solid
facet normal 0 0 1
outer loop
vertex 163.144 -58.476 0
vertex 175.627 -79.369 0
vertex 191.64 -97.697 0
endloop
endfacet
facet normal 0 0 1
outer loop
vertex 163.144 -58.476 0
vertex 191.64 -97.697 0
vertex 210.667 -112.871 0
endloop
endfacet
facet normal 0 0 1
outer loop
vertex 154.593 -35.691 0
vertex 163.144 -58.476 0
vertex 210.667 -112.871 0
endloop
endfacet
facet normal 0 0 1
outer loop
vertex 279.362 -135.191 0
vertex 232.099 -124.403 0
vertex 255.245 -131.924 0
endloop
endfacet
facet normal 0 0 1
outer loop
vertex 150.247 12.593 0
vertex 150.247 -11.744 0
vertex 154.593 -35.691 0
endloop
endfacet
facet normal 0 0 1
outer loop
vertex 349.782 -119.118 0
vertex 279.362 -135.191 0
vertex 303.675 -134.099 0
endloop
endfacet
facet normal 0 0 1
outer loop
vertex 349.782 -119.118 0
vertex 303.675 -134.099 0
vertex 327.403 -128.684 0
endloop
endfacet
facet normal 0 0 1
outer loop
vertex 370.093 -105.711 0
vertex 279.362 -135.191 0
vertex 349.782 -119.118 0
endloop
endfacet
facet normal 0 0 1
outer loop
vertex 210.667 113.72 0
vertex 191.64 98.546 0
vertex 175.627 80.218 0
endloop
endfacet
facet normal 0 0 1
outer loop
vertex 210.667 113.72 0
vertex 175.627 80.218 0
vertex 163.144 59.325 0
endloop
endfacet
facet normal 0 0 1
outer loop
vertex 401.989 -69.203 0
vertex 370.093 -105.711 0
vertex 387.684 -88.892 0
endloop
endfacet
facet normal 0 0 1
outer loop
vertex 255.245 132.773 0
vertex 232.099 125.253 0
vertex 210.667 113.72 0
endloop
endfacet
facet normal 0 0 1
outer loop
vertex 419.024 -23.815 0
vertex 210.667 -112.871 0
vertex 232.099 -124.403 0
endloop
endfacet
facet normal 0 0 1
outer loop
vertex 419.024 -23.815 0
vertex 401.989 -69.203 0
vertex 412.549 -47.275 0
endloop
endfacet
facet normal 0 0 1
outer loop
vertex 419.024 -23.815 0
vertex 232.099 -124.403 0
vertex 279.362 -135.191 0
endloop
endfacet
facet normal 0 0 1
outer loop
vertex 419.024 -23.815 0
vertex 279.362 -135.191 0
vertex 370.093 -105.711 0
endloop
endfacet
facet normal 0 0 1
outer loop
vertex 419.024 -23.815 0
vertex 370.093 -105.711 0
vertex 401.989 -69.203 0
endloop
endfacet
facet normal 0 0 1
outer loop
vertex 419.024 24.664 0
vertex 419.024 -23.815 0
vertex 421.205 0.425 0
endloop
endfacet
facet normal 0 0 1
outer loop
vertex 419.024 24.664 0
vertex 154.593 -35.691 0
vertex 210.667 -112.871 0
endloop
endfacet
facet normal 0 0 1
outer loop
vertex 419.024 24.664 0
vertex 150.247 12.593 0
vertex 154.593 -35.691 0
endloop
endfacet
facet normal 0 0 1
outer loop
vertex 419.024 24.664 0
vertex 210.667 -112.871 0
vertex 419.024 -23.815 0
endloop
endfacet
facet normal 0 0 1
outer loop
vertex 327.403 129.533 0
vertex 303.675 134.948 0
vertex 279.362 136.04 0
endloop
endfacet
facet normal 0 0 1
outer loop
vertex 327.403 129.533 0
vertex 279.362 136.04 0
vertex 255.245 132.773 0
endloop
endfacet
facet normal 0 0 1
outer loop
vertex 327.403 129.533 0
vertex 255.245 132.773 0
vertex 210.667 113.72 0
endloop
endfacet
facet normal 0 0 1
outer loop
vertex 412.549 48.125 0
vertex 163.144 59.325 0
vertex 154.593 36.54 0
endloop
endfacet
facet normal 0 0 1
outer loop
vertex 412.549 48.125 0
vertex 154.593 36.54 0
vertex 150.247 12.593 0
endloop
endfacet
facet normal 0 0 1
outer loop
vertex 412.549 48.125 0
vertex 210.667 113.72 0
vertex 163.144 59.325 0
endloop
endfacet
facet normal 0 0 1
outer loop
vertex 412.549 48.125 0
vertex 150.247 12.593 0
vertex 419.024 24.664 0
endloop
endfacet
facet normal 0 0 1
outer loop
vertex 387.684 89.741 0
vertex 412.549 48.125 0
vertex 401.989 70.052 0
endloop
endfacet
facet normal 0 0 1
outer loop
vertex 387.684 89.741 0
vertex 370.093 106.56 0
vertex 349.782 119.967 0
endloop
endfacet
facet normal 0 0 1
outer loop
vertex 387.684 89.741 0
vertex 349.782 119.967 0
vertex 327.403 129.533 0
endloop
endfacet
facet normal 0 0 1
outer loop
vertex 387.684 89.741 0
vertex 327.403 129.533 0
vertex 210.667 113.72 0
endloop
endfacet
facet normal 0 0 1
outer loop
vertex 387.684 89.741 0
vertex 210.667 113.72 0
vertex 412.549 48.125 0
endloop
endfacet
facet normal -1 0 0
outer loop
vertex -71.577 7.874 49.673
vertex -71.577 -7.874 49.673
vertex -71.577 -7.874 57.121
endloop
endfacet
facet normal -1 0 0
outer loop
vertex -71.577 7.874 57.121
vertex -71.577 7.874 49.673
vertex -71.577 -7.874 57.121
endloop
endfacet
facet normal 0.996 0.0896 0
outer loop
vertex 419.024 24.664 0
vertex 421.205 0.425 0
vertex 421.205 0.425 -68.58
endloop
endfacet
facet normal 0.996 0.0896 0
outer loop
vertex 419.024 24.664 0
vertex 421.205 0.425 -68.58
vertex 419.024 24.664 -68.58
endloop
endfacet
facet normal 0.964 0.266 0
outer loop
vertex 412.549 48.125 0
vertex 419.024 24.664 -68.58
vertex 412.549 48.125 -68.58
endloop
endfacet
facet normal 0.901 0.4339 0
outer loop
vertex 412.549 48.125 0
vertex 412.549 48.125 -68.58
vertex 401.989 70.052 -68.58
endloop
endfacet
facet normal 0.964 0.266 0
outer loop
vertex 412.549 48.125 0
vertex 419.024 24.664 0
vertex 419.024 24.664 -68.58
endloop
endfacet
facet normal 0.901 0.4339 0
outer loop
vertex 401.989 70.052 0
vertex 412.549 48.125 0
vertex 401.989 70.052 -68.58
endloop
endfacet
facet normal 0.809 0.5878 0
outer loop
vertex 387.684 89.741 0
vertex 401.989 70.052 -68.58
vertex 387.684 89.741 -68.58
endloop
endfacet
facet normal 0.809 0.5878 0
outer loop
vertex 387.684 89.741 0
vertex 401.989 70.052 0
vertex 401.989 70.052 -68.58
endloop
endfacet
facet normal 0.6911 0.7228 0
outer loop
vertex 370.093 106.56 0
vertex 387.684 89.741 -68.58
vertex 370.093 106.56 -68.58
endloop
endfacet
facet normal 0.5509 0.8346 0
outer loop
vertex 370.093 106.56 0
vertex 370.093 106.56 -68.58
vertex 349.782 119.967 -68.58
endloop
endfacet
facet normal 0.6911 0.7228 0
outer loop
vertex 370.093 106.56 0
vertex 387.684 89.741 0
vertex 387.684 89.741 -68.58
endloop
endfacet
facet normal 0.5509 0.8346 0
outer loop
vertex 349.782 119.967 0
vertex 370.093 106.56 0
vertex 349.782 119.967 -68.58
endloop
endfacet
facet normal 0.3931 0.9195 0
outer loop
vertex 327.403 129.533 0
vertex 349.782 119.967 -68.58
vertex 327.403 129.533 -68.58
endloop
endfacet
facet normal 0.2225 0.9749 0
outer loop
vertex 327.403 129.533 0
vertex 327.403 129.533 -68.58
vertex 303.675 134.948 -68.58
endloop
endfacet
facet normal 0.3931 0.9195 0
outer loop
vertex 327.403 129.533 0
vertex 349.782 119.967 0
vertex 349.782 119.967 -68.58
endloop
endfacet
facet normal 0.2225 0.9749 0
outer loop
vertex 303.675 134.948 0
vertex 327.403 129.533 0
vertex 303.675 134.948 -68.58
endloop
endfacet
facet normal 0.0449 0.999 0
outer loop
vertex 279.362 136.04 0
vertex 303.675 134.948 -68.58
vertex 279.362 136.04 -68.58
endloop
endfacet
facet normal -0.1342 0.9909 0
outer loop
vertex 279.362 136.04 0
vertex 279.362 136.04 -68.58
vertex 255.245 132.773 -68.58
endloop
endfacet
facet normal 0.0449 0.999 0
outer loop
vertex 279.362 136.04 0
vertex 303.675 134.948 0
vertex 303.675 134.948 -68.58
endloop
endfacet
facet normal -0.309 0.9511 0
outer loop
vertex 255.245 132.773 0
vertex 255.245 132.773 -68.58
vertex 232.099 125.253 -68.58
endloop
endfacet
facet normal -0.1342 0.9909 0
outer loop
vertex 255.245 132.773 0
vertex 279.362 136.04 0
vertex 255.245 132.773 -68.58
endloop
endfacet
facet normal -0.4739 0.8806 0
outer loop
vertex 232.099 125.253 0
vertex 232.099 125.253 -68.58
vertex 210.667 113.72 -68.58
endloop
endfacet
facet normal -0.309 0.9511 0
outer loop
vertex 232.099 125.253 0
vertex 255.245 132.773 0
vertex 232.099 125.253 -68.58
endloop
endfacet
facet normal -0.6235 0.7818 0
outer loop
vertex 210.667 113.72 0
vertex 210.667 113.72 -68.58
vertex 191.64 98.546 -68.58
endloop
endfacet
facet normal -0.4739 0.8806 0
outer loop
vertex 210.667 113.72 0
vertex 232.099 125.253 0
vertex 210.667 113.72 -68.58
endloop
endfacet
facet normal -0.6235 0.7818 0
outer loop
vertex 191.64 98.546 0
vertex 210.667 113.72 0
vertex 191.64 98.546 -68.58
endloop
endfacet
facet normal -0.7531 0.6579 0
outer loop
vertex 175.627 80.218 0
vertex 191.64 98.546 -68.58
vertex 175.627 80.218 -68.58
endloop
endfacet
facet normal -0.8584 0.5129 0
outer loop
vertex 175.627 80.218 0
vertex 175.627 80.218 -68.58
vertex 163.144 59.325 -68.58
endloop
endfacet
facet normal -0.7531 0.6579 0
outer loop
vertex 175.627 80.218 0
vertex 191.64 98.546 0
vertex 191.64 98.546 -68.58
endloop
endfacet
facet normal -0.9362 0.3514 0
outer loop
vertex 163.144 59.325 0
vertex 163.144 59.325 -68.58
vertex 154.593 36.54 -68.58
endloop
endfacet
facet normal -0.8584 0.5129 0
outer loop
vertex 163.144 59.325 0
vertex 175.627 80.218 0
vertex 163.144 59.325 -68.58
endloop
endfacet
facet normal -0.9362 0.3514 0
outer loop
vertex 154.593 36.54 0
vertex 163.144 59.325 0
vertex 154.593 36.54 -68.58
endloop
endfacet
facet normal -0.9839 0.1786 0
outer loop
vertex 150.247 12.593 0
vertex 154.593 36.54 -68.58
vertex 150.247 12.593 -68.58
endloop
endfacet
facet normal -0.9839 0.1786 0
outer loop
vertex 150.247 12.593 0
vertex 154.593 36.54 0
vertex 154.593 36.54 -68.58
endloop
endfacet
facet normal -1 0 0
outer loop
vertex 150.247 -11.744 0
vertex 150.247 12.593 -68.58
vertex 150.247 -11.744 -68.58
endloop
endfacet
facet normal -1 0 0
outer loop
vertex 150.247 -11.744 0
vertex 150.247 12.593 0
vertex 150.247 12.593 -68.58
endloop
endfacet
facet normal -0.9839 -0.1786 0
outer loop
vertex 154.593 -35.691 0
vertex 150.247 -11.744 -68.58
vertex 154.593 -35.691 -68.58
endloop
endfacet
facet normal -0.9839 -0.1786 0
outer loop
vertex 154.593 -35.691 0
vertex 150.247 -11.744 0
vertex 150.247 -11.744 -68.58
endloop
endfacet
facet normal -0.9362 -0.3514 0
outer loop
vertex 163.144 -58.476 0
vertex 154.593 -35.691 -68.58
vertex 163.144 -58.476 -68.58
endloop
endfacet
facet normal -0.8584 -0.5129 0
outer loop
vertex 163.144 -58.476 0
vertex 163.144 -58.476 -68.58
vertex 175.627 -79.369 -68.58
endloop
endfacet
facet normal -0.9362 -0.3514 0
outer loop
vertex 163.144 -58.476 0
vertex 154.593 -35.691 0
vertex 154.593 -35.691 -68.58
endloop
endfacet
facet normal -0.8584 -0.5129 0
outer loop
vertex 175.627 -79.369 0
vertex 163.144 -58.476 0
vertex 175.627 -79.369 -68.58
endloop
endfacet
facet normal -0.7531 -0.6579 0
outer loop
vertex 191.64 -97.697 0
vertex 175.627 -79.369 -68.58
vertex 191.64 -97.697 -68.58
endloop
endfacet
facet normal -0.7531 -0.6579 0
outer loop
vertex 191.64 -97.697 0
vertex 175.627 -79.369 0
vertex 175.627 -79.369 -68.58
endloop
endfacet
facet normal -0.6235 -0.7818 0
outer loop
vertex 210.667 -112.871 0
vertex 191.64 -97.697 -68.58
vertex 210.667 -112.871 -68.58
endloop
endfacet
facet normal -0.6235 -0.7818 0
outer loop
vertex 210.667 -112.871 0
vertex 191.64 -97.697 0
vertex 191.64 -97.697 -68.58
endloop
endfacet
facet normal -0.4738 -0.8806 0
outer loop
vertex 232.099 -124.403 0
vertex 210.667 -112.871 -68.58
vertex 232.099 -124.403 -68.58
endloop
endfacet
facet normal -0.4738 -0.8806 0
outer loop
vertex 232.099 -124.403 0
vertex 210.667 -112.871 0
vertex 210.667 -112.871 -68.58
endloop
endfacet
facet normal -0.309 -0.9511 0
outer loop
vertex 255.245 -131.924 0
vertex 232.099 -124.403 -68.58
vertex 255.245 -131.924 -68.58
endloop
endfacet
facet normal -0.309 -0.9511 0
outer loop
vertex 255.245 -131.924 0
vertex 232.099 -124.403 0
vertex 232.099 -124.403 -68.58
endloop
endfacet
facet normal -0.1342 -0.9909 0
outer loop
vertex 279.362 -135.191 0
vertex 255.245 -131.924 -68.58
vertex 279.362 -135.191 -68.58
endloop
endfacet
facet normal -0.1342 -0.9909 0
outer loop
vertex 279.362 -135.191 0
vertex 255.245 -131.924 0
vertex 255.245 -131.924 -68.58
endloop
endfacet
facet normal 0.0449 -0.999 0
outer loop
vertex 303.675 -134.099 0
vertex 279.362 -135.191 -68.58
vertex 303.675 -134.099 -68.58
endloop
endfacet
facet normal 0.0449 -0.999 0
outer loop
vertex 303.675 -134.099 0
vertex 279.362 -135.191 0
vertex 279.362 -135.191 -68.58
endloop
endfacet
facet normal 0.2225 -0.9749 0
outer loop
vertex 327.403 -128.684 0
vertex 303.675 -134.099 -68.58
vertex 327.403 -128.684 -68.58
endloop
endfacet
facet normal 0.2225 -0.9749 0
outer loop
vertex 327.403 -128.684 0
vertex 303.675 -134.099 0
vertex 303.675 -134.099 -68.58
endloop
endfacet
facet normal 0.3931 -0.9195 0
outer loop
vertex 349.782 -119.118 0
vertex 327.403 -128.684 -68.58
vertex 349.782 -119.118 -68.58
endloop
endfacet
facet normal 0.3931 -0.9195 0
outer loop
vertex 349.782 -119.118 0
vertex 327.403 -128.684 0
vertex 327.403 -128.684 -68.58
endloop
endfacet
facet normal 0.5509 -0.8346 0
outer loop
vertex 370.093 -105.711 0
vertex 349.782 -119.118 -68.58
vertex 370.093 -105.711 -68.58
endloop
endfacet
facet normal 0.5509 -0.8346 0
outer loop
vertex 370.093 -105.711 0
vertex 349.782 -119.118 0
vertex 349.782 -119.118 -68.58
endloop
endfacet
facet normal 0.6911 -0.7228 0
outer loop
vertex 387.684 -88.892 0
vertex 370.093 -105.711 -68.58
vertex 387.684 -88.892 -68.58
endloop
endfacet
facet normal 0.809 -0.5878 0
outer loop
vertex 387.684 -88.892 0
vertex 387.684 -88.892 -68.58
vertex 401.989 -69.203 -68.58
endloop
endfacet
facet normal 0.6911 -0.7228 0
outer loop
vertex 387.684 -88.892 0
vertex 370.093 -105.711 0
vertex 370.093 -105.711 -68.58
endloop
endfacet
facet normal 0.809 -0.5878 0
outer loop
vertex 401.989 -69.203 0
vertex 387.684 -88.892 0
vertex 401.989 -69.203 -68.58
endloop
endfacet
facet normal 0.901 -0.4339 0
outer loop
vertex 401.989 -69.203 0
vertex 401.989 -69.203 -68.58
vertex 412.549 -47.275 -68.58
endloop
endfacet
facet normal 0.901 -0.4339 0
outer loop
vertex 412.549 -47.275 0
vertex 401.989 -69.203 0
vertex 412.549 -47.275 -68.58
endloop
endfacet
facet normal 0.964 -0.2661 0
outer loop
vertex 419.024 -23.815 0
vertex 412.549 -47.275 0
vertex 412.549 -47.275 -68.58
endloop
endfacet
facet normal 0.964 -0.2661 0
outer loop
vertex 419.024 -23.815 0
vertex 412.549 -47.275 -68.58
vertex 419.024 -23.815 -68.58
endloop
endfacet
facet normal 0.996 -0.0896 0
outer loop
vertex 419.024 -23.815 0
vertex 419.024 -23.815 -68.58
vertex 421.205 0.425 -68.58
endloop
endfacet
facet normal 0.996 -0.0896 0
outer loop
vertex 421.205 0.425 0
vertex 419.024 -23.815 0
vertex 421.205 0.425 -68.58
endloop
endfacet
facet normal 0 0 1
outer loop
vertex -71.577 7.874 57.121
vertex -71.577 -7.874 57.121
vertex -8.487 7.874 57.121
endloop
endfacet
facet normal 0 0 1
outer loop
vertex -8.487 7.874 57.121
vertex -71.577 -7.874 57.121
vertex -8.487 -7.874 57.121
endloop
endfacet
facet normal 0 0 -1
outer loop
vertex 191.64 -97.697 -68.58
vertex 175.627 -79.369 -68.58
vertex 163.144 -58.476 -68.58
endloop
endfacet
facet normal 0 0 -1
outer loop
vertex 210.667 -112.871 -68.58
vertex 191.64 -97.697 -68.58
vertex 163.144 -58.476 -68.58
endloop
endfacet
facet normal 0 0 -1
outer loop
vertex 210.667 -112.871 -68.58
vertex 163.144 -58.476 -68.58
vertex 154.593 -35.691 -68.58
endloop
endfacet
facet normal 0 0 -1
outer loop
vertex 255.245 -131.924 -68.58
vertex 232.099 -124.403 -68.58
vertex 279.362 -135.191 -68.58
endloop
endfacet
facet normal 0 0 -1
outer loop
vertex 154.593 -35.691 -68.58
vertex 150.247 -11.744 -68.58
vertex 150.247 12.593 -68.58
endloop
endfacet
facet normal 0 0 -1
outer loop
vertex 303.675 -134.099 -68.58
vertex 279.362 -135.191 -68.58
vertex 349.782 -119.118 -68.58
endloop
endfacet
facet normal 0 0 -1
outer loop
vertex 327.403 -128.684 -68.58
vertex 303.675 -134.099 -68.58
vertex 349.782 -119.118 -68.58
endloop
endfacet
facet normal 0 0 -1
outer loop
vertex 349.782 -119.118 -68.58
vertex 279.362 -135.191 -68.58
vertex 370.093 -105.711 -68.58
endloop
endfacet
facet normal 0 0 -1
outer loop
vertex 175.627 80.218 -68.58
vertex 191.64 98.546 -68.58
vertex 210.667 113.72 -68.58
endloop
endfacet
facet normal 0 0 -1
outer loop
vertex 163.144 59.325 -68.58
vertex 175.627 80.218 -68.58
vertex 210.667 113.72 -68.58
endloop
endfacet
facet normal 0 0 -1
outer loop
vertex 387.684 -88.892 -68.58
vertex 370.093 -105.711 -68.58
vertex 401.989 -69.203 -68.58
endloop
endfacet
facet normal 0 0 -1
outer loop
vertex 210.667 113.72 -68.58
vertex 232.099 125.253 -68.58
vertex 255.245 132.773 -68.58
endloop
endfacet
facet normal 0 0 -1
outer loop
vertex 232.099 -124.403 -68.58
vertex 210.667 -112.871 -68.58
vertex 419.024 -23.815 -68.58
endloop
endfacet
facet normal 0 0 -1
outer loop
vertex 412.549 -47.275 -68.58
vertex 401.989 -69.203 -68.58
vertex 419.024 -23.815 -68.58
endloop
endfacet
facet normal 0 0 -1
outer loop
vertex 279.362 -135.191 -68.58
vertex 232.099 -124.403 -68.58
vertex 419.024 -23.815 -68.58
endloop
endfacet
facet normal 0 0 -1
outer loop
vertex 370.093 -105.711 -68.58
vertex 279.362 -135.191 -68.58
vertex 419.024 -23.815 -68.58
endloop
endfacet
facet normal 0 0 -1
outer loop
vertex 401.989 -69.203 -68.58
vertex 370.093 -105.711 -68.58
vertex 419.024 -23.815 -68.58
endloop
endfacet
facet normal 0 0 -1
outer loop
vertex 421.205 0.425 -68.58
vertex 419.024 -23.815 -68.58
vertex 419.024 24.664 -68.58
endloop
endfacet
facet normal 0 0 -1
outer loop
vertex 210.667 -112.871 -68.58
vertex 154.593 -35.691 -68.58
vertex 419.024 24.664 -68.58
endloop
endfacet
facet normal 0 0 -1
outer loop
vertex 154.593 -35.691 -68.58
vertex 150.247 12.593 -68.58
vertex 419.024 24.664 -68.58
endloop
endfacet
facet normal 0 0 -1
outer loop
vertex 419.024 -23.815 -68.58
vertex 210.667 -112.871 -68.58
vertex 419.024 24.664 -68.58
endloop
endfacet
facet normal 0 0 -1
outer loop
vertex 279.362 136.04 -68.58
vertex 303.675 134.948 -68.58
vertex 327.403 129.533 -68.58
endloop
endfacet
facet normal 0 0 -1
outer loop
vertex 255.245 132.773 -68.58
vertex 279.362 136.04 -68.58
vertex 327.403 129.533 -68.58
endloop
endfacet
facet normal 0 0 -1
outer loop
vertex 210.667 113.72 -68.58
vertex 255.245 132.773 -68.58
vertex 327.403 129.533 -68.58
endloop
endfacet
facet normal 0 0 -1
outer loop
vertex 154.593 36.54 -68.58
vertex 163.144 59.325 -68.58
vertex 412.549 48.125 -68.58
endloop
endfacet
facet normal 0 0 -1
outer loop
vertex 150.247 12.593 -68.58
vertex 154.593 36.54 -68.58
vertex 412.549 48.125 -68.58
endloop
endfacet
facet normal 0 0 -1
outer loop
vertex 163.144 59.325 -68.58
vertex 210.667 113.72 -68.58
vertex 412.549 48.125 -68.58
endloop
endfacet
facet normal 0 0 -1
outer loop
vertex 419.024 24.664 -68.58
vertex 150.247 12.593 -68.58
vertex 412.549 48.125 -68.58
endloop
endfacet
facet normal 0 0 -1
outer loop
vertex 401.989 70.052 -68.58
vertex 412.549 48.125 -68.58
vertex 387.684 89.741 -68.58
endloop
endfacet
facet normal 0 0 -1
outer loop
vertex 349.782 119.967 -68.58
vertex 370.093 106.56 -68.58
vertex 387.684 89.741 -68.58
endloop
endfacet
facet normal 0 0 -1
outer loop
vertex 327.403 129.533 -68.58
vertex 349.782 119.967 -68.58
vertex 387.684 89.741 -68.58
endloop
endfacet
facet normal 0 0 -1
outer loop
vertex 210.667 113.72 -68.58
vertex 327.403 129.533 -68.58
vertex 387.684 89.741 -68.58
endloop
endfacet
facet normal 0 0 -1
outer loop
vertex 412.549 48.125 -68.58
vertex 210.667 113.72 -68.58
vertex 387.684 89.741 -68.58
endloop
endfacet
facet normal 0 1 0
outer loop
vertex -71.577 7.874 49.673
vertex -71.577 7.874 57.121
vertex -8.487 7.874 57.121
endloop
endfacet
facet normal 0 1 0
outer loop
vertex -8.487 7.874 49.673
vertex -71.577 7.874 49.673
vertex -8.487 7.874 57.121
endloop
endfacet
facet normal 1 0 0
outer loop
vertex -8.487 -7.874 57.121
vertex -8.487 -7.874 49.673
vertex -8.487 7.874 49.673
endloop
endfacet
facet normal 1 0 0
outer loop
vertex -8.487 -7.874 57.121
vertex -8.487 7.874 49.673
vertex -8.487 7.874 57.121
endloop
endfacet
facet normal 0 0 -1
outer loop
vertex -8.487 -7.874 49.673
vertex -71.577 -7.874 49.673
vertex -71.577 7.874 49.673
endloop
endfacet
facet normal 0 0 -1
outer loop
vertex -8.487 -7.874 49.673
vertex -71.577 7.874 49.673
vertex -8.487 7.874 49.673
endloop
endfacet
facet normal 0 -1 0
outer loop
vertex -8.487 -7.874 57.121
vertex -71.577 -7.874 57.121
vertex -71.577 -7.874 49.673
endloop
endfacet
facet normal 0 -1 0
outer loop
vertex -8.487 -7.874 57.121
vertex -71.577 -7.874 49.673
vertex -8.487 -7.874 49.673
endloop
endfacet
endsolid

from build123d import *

# Parameters (mm, degrees)
F3_W     = 63.0901316181
F3_H     = 7.4481330812
F4_DEPTH = 7.874
F8_DEPTH = 68.58


# Not quite as in the source:
# - the program builds the solid bodies; features that only make, move or delete a surface that nothing else refers to are left out


with BuildPart() as f4:
    # F3 (on Front) → F4 (new body, symmetric)
    with BuildSketch(Plane.XZ):
        with Locations((-40.032423567, 53.3972028643)):
            Rectangle(F3_W, F3_H)
    extrude(amount=F4_DEPTH, both=True)


with BuildPart() as f8:
    # F7 (on Top) → F8 (new body)
    with BuildSketch(Plane.XY):
        with BuildLine():
            ThreePointArc((149.7005671263, 0.4245620221), (285.452902317, -135.3277731687), (421.2052375078, 0.4245620221))
            ThreePointArc((421.2052375078, 0.4245620221), (285.452902317, 136.1768972129), (149.7005671263, 0.4245620221))
        make_face()
    extrude(amount=-F8_DEPTH)


solid = Compound([f4.part, f8.part])
